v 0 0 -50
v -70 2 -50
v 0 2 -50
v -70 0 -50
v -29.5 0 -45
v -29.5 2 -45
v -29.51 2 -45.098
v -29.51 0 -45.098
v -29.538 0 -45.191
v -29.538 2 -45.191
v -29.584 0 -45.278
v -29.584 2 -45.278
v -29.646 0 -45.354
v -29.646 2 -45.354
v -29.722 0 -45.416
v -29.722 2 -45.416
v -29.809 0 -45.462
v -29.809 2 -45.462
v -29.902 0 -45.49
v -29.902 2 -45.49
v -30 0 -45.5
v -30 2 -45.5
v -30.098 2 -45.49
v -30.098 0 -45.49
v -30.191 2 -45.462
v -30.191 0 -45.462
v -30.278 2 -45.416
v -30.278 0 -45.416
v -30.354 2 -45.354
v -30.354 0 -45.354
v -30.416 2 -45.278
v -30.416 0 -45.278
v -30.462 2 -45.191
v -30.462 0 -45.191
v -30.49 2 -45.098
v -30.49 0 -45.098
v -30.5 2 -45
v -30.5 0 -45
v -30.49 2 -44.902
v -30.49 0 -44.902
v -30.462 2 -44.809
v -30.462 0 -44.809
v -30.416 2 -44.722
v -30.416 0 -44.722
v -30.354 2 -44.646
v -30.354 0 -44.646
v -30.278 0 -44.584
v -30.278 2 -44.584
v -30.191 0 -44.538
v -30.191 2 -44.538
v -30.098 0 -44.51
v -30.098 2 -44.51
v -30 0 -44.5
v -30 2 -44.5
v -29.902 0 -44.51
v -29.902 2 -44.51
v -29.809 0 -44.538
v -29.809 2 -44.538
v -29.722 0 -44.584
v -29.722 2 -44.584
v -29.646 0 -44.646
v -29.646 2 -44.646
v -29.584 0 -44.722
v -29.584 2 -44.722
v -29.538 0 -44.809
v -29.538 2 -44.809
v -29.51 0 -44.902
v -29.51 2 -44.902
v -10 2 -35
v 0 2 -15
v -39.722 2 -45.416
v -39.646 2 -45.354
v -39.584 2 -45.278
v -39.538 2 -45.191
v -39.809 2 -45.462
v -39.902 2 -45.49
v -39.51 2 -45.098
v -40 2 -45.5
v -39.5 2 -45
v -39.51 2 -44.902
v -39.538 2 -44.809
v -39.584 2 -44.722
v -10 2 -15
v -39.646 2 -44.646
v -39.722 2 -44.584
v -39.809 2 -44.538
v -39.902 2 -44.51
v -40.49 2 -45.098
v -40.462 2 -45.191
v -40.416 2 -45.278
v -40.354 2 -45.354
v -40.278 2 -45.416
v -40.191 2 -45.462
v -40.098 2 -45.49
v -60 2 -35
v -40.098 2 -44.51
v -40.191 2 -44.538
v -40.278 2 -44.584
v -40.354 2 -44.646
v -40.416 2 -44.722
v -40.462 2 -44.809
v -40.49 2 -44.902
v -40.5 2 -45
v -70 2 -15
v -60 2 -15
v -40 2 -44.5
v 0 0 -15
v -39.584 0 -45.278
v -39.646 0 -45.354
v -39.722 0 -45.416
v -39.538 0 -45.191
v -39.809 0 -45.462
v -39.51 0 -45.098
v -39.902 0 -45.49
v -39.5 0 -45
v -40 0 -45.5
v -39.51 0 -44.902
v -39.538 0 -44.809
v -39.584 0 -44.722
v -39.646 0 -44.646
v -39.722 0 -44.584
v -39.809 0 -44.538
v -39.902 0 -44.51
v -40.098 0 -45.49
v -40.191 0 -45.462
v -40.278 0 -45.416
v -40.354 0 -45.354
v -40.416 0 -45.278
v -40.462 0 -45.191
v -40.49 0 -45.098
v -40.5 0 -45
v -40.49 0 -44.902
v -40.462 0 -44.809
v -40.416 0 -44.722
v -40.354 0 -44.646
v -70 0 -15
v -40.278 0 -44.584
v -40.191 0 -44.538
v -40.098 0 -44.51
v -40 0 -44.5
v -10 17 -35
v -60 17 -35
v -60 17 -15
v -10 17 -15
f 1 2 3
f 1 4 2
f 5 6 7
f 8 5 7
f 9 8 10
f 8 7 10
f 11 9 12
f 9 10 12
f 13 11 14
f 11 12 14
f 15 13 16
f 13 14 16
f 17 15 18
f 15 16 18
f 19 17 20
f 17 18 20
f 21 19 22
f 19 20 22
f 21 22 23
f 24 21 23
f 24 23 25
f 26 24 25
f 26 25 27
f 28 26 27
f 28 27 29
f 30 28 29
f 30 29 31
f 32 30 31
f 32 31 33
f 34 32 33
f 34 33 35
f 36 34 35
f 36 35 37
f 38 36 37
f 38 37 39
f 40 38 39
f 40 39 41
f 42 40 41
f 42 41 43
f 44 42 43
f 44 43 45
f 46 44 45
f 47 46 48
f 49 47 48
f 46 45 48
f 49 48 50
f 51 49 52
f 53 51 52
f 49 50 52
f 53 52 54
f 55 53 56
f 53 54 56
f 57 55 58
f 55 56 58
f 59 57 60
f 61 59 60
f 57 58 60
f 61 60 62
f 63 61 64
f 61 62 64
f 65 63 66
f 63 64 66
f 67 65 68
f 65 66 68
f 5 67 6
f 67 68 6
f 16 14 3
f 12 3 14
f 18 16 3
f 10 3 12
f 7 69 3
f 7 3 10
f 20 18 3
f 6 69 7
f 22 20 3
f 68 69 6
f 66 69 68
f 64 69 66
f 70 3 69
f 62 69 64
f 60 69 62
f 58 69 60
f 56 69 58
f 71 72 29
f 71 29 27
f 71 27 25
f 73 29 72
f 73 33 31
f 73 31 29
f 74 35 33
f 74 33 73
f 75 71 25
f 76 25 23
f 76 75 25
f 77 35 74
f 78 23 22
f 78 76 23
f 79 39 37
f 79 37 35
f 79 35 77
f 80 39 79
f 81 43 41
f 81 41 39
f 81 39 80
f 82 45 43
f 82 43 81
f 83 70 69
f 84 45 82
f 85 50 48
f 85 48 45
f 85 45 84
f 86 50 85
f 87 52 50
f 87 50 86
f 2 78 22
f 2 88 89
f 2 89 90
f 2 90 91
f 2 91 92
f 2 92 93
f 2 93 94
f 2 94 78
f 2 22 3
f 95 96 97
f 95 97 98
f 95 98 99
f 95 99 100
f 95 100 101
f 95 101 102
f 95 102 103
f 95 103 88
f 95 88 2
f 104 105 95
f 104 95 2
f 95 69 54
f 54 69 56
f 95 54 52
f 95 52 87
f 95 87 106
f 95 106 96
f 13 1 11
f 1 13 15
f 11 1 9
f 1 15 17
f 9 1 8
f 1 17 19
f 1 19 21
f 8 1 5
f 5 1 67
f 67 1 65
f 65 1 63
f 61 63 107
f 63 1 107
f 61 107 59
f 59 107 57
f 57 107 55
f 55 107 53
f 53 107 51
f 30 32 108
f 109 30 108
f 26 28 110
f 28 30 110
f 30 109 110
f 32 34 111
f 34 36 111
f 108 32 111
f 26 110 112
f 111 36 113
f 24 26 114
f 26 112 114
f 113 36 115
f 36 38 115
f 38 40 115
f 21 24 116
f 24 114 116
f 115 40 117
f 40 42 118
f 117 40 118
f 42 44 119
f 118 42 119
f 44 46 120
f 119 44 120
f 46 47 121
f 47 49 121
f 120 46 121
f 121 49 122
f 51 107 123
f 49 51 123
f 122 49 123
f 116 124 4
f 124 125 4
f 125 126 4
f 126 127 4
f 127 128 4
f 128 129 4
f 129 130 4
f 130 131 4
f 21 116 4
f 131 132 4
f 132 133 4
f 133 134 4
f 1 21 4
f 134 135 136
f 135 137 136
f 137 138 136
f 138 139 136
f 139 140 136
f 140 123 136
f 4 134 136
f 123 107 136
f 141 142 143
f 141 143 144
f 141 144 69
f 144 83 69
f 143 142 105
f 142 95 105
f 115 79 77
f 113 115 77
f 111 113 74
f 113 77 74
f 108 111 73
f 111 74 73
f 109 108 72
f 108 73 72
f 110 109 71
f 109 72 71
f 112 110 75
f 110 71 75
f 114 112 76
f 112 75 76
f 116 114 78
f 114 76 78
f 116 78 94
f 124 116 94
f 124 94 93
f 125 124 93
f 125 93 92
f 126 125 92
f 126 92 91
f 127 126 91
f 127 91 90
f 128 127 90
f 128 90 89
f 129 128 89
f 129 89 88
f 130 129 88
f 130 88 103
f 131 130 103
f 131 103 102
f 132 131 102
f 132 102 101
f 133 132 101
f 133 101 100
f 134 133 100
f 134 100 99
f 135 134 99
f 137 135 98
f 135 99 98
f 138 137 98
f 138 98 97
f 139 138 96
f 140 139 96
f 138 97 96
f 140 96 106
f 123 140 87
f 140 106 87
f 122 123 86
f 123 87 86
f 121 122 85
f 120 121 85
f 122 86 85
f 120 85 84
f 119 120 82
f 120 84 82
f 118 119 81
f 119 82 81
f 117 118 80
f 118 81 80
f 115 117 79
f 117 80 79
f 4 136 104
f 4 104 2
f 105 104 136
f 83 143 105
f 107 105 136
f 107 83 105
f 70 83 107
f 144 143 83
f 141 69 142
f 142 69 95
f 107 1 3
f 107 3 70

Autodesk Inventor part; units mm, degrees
ref_plane "YZ Plane" through (0, 0, 0) normal (1, 0, 0) x (0, 1, 0)
ref_plane "XZ Plane" through (0, 0, 0) normal (0, 1, 0) x (-1, 0, 0)
ref_plane "XY Plane" through (0, 0, 0) normal (0, 0, 1) x (1, 0, 0)
sketch "Sketch1" plane through (0, 0, 0) normal (0, 1, 0) x (-1, 0, 0)
  line L0 (0, 0) -> (70, 0)
  line L1 (70, 0) -> (70, -50)
  line L2 (70, -50) -> (0, -50)
  line L3 (0, -50) -> (0, 0)
  dimension "d0" = 70
  dimension "d1" = 50
extrude "Extrusion1" add sketch "Sketch1" along normal blind 2
sketch "Sketch2" plane through (0, 2, 0) normal (0, 1, 0) x (1, 0, 0)
  line L0 (-70, 50) -> (-70, 0) projected
  line L1 (-70, 25) -> (-60, 25)
  line L2 (-60, 25) -> (-60, 15)
  line L3 (-60, 15) -> (-10, 15)
  line L4 (-10, 15) -> (-10, 35)
  line L5 (-10, 35) -> (-60, 35)
  line L6 (-60, 35) -> (-60, 15)
  point P0 (0, 0)
  dimension "d4" = 10
  dimension "d5" = 10
  dimension "d6" = 50
  dimension "d7" = 20
  dimension "d20" = 25
  dimension "d21" = 25
extrude "Extrusion2" add sketch "Sketch2" along normal blind 15
sketch "Sketch3" plane through (0, 2, 0) normal (0, 1, 0) x (1, 0, 0)
  line L0 (0, 50) -> (-70, 50) projected
  line L1 (0, 50) -> (-30, 50)
  line L2 (-30, 50) -> (-30, 45)
  line L3 (-30, 45) -> (0, 45)
  line L4 (0, 45) -> (0, 50)
  line L5 (-70, 50) -> (-70, 0) projected
  line L6 (-70, 0) -> (-40, 0)
  line L7 (-40, 0) -> (-40, 5)
  line L8 (-40, 5) -> (-70, 5)
  line L9 (-70, 5) -> (-70, 0)
  line L10 (-30, 45) -> (-40, 45)
  line L11 (-40, 45) -> (-40, 5)
  line L12 (-40, 5) -> (-30, 5)
  line L13 (-30, 5) -> (-30, 45)
  circle A0 centre (-30, 5) radius 0.5
  circle A1 centre (-40, 5) radius 0.5
  circle A2 centre (-30, 45) radius 0.5
  circle A3 centre (-40, 45) radius 0.5
  point P0 (0, 0)
  dimension "d10" = 30
  dimension "d11" = 5
  dimension "d12" = 30
  dimension "d13" = 5
  dimension "d14" = 1
  dimension "d15" = 1
  dimension "d16" = 1
  dimension "d17" = 1
extrude "Extrusion3" cut sketch "Sketch3" against normal blind 15 contours A2 L3 L2 | L2 L10 A2 | A2 L13 L3 | L13 A2 L10 | A1 L11 L8 | L8 L7 A1 | A3 L11 L10 | L10 L11 A3 | A0 L12 L13 | L13 L12 A0 | L12 A1 L7 | L11 A1 L12
sketch "Sketch4" plane through (0, 2, 0) normal (0, 1, 0) x (1, 0, 0)
  line L0 (0, 0) -> (0, 50) projected
  line L1 (-70, 50) -> (-70, 0) projected
  line L2 (0, 0) -> (-70, 0)
  line L3 (-70, 0) -> (-70, 15)
  line L4 (-70, 15) -> (0, 15)
  line L5 (0, 15) -> (0, 0)
  dimension "d22" = 15
extrude "Extrusion4" cut sketch "Sketch4" against normal blind 15
properties part number "RPpico_dummy"
